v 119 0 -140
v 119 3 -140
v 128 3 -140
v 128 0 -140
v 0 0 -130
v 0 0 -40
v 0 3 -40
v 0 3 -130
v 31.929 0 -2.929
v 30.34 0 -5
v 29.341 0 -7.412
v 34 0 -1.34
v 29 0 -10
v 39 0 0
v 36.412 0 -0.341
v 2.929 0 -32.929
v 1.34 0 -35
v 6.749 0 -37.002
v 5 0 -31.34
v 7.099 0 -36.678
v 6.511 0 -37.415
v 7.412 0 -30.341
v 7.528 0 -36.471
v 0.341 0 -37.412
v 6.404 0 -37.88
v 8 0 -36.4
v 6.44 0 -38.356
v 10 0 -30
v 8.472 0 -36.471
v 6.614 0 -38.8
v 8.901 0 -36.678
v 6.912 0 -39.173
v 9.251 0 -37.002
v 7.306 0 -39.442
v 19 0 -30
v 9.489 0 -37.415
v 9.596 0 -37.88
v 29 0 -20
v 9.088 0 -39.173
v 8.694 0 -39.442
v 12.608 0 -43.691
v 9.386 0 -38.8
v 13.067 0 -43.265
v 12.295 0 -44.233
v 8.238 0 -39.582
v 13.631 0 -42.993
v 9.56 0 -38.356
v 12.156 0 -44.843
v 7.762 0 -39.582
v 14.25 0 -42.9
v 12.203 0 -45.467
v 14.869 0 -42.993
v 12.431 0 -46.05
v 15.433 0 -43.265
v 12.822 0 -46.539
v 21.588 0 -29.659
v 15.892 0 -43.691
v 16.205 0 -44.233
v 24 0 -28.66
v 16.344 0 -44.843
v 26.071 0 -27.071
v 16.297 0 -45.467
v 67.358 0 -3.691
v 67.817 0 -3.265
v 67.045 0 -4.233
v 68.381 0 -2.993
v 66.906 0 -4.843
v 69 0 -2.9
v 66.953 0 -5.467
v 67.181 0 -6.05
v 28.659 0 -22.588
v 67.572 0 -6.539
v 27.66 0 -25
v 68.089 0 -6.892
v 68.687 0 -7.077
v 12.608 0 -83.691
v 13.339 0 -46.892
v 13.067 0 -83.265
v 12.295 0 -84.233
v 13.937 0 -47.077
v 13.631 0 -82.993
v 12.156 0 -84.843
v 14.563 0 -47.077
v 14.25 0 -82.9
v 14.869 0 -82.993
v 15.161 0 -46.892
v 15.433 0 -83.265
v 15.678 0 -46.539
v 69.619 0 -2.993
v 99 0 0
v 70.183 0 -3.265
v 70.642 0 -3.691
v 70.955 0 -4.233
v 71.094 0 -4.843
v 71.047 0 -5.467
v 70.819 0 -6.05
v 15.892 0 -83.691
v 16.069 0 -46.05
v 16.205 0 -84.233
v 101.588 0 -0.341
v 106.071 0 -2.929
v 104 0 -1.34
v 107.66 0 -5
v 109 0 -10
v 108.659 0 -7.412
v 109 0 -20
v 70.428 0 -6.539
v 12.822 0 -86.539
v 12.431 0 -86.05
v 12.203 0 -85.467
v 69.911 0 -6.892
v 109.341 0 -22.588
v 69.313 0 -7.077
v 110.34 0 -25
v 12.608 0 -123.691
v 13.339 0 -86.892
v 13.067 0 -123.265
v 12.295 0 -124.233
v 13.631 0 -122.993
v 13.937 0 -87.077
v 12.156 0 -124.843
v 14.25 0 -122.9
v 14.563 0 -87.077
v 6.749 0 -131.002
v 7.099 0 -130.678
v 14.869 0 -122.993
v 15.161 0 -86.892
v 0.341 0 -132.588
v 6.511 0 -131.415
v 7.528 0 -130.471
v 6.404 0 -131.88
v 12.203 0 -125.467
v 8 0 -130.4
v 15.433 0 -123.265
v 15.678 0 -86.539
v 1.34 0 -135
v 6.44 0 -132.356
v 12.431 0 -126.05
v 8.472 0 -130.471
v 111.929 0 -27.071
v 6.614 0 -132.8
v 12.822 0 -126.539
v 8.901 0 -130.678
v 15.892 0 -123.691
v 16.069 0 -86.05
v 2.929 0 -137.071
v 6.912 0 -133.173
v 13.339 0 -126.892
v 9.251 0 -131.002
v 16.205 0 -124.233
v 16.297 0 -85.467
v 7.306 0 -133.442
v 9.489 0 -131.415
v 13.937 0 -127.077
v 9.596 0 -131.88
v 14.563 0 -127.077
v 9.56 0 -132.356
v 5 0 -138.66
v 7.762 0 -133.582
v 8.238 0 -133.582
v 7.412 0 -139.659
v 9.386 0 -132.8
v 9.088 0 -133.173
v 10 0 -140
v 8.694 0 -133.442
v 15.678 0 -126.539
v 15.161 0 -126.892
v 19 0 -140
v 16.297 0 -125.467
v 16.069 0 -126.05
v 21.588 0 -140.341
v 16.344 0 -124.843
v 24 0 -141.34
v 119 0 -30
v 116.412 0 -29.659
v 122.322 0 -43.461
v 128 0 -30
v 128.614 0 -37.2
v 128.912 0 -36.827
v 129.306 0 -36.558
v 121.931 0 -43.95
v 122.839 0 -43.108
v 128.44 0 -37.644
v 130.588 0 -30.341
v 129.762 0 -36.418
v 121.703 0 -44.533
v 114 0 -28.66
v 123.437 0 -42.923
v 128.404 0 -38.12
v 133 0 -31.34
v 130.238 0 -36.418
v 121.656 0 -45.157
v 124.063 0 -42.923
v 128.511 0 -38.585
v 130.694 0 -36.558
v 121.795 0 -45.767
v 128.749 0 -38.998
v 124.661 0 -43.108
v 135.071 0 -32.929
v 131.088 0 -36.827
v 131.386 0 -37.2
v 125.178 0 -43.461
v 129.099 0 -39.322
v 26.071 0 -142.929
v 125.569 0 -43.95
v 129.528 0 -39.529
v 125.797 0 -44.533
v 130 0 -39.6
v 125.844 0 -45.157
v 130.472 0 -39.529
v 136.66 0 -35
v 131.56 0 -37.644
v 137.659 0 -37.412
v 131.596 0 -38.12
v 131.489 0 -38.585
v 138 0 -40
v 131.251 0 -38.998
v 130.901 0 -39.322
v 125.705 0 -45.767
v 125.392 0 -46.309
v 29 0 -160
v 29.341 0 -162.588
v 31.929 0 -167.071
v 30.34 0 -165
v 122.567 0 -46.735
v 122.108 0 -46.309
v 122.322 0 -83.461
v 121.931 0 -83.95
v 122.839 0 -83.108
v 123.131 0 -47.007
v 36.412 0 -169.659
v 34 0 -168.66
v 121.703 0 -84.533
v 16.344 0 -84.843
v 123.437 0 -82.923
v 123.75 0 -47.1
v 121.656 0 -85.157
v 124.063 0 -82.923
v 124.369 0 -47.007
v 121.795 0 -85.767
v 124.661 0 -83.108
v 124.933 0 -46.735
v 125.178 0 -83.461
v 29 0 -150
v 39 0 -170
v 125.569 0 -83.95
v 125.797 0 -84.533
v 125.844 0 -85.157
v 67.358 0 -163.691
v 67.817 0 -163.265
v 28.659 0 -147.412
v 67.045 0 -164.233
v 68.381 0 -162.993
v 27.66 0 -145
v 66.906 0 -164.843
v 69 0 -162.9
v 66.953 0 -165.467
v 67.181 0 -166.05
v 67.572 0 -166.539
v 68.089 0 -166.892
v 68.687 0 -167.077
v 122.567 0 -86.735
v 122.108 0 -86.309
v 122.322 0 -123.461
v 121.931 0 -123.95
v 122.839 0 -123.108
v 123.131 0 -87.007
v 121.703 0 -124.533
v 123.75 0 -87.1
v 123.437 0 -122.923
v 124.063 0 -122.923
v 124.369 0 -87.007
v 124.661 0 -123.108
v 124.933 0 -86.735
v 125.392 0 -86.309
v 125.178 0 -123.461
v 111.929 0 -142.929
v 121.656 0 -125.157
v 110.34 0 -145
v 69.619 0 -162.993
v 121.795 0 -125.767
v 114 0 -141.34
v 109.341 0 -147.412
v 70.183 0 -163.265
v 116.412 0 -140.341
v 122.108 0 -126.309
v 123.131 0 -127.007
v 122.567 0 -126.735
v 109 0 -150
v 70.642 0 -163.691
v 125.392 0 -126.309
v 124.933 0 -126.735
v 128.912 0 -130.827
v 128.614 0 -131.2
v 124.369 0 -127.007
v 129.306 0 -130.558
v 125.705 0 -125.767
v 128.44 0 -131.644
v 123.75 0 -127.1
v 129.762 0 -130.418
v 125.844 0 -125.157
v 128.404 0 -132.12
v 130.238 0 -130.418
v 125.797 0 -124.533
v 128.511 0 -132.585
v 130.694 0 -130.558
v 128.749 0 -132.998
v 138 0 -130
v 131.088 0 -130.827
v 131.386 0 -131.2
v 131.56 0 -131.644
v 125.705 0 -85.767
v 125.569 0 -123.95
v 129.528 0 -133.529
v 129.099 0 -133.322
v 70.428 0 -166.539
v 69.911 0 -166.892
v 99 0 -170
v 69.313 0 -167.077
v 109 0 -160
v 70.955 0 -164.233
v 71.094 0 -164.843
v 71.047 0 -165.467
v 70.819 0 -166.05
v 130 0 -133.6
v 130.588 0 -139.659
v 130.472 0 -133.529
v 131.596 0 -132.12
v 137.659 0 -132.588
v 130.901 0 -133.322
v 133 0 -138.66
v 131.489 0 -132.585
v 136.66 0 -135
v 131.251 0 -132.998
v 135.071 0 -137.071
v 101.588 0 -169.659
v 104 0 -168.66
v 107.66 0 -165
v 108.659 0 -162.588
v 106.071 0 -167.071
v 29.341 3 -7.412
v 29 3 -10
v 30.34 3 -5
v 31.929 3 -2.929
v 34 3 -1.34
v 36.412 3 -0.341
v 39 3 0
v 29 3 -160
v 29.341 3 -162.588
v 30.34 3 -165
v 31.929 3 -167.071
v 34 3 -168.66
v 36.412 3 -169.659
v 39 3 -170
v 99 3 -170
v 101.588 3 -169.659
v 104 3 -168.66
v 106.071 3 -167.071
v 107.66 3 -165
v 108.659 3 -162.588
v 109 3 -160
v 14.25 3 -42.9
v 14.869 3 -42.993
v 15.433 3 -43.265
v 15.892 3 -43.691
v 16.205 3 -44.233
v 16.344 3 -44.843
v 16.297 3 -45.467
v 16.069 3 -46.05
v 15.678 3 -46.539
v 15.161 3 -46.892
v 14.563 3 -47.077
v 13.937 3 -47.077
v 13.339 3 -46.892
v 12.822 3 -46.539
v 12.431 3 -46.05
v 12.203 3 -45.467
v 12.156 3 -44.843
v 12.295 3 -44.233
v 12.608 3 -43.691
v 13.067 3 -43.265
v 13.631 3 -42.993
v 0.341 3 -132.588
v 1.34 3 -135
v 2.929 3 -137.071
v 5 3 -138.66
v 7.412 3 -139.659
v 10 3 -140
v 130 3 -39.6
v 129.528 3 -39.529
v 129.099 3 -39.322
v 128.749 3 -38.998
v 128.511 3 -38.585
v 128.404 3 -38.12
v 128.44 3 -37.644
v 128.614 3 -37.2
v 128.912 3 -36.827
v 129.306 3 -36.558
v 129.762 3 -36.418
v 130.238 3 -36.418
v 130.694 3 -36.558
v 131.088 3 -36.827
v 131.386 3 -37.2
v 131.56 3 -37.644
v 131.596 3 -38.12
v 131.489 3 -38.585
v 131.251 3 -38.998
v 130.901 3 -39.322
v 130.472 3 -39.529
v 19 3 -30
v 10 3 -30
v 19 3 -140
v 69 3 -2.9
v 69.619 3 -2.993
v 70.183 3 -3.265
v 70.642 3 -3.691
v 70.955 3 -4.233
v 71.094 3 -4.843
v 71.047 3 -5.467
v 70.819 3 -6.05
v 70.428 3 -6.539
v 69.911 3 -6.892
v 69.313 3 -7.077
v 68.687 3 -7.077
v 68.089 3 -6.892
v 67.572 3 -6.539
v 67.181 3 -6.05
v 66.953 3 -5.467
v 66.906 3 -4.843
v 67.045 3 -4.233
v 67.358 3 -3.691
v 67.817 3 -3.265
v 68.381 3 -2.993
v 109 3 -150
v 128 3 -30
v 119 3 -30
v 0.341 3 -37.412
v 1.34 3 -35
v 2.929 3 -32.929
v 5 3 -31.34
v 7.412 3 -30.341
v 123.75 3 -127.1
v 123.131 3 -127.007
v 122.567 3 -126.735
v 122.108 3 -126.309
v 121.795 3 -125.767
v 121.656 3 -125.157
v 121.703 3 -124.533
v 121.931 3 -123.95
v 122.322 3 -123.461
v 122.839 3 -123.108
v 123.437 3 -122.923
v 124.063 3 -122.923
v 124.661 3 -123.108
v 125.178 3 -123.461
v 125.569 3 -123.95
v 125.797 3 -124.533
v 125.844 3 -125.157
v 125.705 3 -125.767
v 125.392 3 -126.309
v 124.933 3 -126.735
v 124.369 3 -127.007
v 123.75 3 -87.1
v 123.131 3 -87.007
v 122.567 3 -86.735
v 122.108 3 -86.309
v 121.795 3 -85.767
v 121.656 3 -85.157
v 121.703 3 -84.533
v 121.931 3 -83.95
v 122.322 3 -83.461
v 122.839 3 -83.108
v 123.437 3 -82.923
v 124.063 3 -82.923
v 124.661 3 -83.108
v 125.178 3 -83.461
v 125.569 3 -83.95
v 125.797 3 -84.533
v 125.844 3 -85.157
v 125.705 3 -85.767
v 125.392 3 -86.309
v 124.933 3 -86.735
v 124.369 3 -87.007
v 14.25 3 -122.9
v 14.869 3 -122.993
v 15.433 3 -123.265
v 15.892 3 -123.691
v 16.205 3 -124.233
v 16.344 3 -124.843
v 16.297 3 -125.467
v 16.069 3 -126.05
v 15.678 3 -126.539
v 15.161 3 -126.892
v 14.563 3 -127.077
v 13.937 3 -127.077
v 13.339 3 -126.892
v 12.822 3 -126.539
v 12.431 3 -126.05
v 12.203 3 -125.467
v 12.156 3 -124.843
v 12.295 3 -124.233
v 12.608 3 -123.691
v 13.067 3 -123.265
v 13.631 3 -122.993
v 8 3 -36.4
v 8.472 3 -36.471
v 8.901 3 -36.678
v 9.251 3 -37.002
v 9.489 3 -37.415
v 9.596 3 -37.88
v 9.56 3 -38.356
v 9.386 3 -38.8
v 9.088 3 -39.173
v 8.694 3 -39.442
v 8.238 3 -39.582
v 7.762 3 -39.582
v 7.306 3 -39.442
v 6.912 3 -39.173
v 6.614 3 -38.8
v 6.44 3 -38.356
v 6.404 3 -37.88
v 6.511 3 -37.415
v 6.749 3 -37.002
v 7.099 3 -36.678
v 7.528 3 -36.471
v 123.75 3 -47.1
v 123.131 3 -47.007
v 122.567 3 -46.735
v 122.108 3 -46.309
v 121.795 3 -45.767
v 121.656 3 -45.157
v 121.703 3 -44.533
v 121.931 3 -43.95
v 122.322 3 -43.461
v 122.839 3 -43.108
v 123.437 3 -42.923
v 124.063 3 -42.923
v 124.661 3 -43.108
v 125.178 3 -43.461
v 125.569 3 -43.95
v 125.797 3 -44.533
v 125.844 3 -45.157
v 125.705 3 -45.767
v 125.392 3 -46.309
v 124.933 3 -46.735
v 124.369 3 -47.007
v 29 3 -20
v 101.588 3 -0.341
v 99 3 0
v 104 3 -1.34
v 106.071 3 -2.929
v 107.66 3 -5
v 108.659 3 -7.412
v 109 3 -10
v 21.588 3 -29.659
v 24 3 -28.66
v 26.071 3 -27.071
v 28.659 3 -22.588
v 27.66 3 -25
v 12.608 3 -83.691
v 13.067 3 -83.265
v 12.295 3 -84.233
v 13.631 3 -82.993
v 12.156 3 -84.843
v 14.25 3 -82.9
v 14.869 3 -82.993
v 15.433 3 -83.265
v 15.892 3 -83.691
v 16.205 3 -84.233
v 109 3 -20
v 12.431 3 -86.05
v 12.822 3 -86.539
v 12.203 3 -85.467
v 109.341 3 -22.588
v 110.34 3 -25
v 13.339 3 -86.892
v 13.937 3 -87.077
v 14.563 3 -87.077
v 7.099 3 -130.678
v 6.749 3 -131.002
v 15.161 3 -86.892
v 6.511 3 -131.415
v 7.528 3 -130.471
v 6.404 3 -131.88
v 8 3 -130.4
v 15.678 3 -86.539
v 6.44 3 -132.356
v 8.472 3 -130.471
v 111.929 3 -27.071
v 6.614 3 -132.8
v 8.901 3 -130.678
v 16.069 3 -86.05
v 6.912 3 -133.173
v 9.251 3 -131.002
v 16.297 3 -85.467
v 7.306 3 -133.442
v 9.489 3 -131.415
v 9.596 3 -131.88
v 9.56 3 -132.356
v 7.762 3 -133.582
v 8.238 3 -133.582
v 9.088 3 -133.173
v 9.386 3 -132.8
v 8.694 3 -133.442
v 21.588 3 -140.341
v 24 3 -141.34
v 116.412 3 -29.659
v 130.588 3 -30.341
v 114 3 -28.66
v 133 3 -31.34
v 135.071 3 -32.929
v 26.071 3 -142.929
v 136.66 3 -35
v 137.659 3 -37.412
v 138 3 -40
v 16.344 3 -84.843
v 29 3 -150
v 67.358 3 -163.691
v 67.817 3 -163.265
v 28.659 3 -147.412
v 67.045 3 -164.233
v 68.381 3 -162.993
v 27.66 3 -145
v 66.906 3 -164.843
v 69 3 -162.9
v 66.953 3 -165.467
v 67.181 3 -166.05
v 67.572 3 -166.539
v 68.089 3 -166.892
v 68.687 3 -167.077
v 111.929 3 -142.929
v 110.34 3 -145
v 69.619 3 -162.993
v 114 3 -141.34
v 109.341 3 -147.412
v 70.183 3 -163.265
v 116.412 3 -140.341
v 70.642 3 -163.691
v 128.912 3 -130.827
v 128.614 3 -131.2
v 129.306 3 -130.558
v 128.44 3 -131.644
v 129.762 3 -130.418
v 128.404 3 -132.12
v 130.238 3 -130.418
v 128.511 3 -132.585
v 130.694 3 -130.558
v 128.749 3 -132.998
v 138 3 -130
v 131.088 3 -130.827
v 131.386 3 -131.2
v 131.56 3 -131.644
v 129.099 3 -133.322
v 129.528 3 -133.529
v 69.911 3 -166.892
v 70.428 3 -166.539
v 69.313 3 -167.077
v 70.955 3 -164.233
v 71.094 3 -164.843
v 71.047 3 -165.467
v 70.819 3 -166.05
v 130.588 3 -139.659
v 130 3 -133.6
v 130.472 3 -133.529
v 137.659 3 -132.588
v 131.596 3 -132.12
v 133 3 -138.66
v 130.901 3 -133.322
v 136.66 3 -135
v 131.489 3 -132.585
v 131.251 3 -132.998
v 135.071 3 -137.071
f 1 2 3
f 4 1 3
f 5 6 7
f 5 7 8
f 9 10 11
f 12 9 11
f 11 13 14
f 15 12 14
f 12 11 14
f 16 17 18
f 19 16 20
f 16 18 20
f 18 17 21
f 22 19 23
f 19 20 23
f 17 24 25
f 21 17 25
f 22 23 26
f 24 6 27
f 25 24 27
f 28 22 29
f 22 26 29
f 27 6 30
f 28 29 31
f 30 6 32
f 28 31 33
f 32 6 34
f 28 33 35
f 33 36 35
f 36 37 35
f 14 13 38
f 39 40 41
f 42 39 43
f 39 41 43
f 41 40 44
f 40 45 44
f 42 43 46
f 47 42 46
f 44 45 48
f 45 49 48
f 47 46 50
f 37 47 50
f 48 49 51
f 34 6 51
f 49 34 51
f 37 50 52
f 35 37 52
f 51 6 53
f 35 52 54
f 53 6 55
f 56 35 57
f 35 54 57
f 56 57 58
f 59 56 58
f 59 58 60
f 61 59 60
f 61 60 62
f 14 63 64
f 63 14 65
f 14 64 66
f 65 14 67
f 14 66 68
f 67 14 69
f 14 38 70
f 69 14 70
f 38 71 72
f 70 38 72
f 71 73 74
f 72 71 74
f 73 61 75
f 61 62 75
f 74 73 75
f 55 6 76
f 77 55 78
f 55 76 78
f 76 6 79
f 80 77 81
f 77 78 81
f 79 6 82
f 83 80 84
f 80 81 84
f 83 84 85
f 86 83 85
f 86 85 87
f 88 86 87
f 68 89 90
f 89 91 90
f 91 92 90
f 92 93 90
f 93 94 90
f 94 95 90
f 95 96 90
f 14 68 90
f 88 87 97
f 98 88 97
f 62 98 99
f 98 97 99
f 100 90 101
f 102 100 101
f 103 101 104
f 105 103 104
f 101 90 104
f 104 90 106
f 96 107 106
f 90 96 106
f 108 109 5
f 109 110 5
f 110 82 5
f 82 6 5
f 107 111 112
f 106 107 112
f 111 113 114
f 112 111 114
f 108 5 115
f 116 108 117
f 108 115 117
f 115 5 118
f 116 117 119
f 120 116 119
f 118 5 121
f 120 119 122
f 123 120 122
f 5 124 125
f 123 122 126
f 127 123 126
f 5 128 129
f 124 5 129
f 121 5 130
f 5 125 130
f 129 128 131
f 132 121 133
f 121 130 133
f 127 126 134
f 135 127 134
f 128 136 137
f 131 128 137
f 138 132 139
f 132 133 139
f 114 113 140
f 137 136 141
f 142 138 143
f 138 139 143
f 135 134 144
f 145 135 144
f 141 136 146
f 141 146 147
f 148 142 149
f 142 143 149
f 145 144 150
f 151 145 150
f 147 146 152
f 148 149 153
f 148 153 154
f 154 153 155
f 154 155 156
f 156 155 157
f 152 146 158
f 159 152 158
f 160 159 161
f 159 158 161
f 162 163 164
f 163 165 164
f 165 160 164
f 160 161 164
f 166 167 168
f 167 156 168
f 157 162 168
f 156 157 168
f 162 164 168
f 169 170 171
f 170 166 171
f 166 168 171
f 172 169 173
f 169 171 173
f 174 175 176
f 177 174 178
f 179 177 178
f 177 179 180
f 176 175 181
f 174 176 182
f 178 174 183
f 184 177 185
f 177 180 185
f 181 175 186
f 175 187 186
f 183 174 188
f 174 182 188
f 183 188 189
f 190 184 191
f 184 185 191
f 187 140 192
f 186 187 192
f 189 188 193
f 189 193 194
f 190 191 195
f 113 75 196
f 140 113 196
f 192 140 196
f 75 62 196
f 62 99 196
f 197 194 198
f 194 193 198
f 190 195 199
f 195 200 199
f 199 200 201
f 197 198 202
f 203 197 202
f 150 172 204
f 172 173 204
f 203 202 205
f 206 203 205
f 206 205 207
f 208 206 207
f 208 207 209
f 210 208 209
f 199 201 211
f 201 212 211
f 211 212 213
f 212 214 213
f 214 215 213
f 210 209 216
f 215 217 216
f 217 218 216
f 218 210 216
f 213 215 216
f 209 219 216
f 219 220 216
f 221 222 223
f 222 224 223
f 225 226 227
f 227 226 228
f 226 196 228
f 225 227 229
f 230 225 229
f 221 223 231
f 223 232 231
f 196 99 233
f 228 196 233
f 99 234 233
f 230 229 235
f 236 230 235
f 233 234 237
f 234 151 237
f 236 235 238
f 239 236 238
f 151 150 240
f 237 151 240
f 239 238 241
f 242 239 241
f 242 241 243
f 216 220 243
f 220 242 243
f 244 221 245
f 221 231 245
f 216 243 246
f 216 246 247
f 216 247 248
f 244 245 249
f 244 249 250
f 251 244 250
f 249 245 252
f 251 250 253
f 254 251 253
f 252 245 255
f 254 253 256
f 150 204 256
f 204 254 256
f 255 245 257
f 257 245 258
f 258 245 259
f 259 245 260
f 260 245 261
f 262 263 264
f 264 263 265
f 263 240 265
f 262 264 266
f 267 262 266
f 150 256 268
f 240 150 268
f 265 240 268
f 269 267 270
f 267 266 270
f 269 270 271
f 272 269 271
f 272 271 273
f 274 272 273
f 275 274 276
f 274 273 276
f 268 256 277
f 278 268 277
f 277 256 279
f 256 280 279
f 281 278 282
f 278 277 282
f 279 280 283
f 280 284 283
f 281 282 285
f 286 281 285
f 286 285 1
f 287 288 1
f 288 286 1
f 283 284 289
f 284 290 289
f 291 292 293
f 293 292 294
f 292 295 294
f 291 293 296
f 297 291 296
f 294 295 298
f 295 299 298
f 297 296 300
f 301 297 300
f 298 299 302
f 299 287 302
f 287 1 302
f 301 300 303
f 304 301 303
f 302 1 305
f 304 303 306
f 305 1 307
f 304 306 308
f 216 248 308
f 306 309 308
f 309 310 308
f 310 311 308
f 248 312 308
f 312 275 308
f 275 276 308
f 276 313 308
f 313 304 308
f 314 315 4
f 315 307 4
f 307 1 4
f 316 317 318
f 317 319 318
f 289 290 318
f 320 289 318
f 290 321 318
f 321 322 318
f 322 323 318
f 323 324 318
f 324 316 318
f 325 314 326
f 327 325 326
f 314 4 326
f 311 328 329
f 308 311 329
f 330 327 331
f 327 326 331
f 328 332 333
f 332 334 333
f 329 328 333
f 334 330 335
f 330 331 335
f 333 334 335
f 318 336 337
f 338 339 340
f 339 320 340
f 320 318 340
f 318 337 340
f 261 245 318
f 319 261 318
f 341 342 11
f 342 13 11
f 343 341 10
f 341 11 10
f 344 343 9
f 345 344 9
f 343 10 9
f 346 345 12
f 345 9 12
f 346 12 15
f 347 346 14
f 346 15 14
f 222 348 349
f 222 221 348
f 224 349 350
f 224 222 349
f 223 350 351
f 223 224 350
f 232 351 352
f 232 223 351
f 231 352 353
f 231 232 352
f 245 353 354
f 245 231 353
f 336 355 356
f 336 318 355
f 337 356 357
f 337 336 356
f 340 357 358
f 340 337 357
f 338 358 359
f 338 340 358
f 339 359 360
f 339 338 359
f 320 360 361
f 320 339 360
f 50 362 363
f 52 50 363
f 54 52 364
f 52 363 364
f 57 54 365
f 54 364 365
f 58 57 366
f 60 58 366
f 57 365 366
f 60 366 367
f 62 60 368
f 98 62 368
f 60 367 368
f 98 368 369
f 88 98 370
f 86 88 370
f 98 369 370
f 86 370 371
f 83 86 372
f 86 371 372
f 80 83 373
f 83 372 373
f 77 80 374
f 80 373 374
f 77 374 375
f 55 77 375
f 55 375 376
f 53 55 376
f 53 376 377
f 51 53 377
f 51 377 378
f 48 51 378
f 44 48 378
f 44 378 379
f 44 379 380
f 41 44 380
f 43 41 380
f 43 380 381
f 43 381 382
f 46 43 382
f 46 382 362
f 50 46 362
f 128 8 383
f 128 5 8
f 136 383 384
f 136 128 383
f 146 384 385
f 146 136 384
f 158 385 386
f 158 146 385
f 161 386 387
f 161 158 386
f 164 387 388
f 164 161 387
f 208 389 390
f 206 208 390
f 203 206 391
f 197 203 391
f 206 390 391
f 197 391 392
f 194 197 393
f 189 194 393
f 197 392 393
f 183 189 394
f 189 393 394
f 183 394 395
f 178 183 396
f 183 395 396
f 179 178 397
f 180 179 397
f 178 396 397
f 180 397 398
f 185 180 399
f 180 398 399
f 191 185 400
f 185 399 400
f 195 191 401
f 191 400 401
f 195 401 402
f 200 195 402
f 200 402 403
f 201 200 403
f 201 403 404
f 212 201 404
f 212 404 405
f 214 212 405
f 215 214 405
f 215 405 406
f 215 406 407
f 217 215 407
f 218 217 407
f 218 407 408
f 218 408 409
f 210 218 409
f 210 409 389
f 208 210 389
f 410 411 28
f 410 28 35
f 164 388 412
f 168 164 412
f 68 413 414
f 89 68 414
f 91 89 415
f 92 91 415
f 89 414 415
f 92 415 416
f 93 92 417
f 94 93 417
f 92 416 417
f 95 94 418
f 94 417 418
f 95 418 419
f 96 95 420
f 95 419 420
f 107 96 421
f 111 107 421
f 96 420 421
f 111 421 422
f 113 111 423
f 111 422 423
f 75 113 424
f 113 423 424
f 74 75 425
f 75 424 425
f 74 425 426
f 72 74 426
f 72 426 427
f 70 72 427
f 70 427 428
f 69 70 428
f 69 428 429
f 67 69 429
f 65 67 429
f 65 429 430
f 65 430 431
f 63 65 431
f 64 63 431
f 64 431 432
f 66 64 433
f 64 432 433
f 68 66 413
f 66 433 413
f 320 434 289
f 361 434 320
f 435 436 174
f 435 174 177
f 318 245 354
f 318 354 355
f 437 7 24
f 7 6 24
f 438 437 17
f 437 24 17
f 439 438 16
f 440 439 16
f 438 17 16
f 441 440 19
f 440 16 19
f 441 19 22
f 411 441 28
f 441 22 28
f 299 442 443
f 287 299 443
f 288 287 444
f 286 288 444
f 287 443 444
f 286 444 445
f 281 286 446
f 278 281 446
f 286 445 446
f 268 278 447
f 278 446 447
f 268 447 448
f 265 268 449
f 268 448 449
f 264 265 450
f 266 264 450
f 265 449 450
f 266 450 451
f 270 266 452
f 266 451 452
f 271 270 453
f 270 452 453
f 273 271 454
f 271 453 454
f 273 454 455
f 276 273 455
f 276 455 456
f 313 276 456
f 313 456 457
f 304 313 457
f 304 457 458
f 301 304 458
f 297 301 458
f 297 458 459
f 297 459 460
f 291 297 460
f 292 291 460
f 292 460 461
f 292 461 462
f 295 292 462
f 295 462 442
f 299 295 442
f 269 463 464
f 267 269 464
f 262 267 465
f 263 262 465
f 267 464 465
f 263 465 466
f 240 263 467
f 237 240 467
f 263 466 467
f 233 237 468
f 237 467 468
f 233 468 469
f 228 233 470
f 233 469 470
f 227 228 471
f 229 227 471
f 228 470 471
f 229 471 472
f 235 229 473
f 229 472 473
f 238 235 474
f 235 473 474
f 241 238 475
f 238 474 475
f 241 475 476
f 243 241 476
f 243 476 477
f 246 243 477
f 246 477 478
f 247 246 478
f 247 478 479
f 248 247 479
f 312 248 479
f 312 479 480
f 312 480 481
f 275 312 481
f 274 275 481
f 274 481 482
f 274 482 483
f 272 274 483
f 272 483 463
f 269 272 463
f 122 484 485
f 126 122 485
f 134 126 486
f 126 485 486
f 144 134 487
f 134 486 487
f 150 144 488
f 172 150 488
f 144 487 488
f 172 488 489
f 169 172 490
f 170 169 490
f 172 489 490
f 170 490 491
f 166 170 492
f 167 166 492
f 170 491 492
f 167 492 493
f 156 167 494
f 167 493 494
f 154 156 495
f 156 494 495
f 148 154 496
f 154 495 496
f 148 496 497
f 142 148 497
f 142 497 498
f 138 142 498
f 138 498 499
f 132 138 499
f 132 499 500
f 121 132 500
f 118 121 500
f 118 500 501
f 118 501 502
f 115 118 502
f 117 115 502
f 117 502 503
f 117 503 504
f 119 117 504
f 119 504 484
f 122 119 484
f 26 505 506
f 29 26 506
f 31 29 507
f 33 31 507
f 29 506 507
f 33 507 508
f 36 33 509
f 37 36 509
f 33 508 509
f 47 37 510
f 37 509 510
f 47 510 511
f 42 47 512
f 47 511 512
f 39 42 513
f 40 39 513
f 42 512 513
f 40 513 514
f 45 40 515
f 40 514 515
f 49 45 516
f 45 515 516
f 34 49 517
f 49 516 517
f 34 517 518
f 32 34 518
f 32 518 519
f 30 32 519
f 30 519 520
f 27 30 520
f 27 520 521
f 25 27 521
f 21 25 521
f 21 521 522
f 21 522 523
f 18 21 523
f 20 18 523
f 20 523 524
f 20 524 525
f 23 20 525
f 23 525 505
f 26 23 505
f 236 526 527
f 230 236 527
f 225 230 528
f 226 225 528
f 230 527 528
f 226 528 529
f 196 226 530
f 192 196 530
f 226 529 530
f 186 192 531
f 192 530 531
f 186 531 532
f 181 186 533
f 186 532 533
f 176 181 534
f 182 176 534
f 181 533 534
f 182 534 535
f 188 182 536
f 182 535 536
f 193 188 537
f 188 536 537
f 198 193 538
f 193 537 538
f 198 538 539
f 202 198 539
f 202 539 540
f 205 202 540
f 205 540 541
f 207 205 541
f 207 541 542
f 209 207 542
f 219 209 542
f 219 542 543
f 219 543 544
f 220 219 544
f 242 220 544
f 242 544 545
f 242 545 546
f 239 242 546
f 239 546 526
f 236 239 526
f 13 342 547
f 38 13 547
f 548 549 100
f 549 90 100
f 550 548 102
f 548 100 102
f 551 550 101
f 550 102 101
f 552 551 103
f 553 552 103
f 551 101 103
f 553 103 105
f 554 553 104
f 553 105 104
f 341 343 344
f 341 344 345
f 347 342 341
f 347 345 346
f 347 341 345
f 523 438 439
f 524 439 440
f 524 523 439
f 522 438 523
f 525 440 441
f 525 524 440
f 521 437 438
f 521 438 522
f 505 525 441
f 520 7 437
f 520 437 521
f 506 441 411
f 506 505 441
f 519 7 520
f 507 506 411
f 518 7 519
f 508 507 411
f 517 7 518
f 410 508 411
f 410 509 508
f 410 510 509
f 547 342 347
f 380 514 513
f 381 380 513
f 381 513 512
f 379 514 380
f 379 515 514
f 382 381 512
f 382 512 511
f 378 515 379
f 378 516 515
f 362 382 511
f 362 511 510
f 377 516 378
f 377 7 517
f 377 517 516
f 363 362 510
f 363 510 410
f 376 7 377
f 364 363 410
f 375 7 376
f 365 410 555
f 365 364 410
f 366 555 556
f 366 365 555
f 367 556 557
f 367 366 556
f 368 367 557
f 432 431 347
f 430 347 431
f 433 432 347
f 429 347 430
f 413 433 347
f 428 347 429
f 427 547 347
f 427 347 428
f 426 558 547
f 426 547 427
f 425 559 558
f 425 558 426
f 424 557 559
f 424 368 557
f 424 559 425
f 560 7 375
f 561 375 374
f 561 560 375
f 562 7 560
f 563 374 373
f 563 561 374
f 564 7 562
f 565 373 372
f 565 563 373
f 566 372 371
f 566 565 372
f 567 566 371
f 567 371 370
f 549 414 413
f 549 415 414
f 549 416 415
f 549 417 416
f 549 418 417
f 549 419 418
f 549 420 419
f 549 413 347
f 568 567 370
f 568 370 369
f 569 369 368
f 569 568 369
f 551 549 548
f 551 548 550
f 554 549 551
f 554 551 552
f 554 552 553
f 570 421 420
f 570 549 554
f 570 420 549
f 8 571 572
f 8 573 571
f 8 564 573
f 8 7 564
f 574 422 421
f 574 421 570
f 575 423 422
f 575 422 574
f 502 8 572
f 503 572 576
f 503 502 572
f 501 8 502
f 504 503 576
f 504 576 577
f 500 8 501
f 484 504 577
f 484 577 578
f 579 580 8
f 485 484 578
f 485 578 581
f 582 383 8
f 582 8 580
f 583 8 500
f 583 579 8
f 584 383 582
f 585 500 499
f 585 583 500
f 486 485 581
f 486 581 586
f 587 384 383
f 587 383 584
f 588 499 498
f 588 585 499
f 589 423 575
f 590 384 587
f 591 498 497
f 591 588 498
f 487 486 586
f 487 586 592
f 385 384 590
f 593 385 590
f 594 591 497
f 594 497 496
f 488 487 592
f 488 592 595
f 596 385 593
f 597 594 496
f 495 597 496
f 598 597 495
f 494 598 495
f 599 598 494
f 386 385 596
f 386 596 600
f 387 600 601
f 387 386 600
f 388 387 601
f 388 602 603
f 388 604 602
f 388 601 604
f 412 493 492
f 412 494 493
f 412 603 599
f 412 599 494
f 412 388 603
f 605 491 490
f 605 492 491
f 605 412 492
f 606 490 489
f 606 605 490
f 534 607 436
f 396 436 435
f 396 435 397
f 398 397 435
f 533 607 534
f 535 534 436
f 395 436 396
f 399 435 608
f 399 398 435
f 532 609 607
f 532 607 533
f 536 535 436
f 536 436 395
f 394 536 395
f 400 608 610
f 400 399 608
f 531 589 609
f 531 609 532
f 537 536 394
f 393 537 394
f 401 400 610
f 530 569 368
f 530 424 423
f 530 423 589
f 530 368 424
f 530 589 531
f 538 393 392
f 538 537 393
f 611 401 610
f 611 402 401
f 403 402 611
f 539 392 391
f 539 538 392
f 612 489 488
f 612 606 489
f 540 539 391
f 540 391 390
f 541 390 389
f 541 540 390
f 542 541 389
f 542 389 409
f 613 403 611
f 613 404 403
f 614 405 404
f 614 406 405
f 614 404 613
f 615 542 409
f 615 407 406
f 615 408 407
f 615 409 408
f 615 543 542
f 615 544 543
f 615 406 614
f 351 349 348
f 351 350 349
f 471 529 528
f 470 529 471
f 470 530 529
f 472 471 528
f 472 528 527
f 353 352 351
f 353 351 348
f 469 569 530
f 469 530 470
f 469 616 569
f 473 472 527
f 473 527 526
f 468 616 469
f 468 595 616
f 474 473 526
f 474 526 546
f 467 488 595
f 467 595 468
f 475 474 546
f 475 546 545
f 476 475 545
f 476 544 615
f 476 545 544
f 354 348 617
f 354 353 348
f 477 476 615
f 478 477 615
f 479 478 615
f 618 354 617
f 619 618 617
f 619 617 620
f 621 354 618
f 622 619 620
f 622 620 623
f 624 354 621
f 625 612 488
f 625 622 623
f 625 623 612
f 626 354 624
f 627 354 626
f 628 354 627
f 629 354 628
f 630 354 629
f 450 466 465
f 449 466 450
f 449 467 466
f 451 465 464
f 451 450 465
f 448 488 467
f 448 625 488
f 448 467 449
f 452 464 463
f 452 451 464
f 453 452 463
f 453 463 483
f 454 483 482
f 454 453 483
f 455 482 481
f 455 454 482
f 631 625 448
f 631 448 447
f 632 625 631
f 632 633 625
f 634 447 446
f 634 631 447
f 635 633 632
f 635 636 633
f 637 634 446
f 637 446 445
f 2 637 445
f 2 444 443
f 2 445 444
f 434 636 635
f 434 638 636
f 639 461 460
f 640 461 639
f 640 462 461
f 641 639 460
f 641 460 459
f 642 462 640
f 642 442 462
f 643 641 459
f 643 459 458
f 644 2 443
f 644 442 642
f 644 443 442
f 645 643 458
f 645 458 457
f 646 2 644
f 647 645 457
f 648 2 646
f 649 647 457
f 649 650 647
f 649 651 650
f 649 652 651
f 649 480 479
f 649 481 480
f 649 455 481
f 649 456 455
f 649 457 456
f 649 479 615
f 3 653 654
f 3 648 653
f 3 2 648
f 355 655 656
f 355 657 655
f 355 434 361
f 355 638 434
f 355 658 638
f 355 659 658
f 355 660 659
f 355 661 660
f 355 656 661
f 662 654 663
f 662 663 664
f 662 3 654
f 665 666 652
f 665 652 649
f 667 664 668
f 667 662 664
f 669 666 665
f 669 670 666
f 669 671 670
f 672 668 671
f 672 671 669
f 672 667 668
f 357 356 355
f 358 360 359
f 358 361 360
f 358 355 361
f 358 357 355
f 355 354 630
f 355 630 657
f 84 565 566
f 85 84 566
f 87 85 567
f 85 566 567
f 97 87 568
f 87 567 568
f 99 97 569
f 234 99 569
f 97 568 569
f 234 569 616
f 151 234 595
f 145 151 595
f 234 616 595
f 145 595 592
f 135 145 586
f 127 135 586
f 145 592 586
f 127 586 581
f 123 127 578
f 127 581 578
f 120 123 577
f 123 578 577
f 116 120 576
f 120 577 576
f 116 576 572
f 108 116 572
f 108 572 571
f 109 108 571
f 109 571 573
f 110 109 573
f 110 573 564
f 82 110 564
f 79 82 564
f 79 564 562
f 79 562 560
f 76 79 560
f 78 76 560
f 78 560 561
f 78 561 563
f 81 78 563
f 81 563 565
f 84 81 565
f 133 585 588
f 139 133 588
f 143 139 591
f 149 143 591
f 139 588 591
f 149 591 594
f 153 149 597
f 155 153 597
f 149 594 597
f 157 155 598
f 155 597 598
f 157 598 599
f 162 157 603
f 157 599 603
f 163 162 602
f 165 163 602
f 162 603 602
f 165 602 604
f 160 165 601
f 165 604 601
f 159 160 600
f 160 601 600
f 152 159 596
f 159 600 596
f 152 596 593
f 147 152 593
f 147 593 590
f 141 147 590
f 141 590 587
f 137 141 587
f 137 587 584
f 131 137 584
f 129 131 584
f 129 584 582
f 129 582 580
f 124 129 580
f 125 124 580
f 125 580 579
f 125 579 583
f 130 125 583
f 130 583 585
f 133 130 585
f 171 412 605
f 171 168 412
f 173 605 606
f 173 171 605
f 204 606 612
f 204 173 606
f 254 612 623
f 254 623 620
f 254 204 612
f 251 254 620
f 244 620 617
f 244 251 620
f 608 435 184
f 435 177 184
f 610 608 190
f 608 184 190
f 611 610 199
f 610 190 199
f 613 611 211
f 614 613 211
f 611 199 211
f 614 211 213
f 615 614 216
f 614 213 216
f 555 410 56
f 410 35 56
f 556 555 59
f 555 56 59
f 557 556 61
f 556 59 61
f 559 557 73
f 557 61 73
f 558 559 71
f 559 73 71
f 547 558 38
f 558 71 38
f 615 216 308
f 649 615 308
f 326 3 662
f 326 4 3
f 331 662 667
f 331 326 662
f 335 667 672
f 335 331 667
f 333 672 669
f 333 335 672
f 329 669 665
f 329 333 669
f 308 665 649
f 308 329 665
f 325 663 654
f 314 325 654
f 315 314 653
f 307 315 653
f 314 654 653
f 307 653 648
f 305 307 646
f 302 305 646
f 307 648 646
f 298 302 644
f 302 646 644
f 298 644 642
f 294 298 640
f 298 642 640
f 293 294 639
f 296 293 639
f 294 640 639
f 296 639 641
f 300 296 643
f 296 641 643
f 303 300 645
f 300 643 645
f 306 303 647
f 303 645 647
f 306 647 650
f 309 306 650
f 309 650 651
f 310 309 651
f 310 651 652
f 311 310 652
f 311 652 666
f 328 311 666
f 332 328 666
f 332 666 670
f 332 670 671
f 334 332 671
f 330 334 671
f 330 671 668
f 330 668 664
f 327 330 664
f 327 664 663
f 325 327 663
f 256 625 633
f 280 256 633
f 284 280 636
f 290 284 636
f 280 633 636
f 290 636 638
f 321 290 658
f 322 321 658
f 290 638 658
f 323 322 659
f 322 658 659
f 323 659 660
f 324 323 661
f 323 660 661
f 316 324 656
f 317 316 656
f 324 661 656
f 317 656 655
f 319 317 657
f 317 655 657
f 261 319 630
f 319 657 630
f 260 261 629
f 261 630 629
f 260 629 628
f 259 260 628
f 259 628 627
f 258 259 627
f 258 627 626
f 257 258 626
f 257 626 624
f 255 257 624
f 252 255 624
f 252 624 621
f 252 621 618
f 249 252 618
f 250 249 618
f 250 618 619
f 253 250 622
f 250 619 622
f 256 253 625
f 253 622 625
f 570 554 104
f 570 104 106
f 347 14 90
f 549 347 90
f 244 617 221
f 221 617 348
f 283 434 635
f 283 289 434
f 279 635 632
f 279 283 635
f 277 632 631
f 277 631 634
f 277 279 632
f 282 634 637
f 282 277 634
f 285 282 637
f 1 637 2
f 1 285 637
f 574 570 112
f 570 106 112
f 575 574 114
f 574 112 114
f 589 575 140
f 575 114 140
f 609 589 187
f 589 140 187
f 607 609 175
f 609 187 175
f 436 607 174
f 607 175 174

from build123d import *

# Parameters (mm, degrees)
SKETCH1_W           = 138
SKETCH1_H           = 170
BOSS_EXTRUDE1_DEPTH = 3
SKETCH2_R           = 2.1
SKETCH2_W           = 29
SKETCH2_H           = 30
CUT_EXTRUDE1_DEPTH  = 3
SKETCH3_R           = 2.1
SKETCH3_R_2         = 1.6
CUT_EXTRUDE2_DEPTH  = 219.981734398
FILLET1_R           = 10


with BuildPart() as part:
    # Sketch1 → Boss-Extrude1 (new body)
    with BuildSketch(Plane(origin=(0, 0, 0), x_dir=(1, 0, 0), z_dir=(0, 1, 0))):
        with Locations((69, 85)):
            Rectangle(SKETCH1_W, SKETCH1_H)
    extrude(amount=BOSS_EXTRUDE1_DEPTH)

    # Sketch2 → Cut-Extrude1 (cut)
    with BuildSketch(Plane(origin=(0, 3, 0), x_dir=(1, 0, 0), z_dir=(0, 1, 0))):
        with Locations(Location((69, 165, 0), (0, 0, 270))):
            Circle(SKETCH2_R)
        with Locations(Location((69, 5, 0), (0, 0, 270))):
            Circle(SKETCH2_R)
        with Locations((14.5, 155)):
            Rectangle(SKETCH2_W, SKETCH2_H)
        with Locations((123.5, 155)):
            Rectangle(SKETCH2_W, SKETCH2_H)
        with Locations((123.5, 15)):
            Rectangle(SKETCH2_W, SKETCH2_H)
        with Locations((14.5, 15)):
            Rectangle(SKETCH2_W, SKETCH2_H)
    extrude(amount=-CUT_EXTRUDE1_DEPTH, mode=Mode.SUBTRACT)

    # Sketch3 → Cut-Extrude2 (cut, through all)
    with BuildSketch(Plane(origin=(0, 3, 0), x_dir=(1, 0, 0), z_dir=(0, 1, 0))):
        with Locations(Location((14.25, 125, 0), (0, 0, 270))):
            Circle(SKETCH3_R)
        with Locations(Location((14.25, 45, 0), (0, 0, 270))):
            Circle(SKETCH3_R)
        with Locations(Location((14.25, 85, 0), (0, 0, 270))):
            Circle(SKETCH3_R)
        with Locations(Location((123.75, 45, 0), (0, 0, 90))):
            Circle(SKETCH3_R)
        with Locations(Location((123.75, 85, 0), (0, 0, 90))):
            Circle(SKETCH3_R)
        with Locations(Location((123.75, 125, 0), (0, 0, 90))):
            Circle(SKETCH3_R)
        with Locations(Location((8, 132, 0), (0, 0, 270))):
            Circle(SKETCH3_R_2)
        with Locations(Location((8, 38, 0), (0, 0, 270))):
            Circle(SKETCH3_R_2)
        with Locations(Location((130, 38, 0), (0, 0, 90))):
            Circle(SKETCH3_R_2)
        with Locations(Location((130, 132, 0), (0, 0, 90))):
            Circle(SKETCH3_R_2)
    extrude(amount=-CUT_EXTRUDE2_DEPTH, mode=Mode.SUBTRACT)

    # Fillet1
    fillet1_edges = [part.edges().sort_by_distance(p)[0] for p in [
        (138, 1.5, -140),
        (109, 1.5, -140),
        (109, 1.5, -170),
        (138, 1.5, -30),
        (109, 1.5, 0),
        (109, 1.5, -30),
        (0, 1.5, -30),
        (29, 1.5, -30),
        (29, 1.5, 0),
        (0, 1.5, -140),
        (29, 1.5, -170),
        (29, 1.5, -140),
    ]]
    fillet(fillet1_edges, radius=FILLET1_R)


solid = part.part
